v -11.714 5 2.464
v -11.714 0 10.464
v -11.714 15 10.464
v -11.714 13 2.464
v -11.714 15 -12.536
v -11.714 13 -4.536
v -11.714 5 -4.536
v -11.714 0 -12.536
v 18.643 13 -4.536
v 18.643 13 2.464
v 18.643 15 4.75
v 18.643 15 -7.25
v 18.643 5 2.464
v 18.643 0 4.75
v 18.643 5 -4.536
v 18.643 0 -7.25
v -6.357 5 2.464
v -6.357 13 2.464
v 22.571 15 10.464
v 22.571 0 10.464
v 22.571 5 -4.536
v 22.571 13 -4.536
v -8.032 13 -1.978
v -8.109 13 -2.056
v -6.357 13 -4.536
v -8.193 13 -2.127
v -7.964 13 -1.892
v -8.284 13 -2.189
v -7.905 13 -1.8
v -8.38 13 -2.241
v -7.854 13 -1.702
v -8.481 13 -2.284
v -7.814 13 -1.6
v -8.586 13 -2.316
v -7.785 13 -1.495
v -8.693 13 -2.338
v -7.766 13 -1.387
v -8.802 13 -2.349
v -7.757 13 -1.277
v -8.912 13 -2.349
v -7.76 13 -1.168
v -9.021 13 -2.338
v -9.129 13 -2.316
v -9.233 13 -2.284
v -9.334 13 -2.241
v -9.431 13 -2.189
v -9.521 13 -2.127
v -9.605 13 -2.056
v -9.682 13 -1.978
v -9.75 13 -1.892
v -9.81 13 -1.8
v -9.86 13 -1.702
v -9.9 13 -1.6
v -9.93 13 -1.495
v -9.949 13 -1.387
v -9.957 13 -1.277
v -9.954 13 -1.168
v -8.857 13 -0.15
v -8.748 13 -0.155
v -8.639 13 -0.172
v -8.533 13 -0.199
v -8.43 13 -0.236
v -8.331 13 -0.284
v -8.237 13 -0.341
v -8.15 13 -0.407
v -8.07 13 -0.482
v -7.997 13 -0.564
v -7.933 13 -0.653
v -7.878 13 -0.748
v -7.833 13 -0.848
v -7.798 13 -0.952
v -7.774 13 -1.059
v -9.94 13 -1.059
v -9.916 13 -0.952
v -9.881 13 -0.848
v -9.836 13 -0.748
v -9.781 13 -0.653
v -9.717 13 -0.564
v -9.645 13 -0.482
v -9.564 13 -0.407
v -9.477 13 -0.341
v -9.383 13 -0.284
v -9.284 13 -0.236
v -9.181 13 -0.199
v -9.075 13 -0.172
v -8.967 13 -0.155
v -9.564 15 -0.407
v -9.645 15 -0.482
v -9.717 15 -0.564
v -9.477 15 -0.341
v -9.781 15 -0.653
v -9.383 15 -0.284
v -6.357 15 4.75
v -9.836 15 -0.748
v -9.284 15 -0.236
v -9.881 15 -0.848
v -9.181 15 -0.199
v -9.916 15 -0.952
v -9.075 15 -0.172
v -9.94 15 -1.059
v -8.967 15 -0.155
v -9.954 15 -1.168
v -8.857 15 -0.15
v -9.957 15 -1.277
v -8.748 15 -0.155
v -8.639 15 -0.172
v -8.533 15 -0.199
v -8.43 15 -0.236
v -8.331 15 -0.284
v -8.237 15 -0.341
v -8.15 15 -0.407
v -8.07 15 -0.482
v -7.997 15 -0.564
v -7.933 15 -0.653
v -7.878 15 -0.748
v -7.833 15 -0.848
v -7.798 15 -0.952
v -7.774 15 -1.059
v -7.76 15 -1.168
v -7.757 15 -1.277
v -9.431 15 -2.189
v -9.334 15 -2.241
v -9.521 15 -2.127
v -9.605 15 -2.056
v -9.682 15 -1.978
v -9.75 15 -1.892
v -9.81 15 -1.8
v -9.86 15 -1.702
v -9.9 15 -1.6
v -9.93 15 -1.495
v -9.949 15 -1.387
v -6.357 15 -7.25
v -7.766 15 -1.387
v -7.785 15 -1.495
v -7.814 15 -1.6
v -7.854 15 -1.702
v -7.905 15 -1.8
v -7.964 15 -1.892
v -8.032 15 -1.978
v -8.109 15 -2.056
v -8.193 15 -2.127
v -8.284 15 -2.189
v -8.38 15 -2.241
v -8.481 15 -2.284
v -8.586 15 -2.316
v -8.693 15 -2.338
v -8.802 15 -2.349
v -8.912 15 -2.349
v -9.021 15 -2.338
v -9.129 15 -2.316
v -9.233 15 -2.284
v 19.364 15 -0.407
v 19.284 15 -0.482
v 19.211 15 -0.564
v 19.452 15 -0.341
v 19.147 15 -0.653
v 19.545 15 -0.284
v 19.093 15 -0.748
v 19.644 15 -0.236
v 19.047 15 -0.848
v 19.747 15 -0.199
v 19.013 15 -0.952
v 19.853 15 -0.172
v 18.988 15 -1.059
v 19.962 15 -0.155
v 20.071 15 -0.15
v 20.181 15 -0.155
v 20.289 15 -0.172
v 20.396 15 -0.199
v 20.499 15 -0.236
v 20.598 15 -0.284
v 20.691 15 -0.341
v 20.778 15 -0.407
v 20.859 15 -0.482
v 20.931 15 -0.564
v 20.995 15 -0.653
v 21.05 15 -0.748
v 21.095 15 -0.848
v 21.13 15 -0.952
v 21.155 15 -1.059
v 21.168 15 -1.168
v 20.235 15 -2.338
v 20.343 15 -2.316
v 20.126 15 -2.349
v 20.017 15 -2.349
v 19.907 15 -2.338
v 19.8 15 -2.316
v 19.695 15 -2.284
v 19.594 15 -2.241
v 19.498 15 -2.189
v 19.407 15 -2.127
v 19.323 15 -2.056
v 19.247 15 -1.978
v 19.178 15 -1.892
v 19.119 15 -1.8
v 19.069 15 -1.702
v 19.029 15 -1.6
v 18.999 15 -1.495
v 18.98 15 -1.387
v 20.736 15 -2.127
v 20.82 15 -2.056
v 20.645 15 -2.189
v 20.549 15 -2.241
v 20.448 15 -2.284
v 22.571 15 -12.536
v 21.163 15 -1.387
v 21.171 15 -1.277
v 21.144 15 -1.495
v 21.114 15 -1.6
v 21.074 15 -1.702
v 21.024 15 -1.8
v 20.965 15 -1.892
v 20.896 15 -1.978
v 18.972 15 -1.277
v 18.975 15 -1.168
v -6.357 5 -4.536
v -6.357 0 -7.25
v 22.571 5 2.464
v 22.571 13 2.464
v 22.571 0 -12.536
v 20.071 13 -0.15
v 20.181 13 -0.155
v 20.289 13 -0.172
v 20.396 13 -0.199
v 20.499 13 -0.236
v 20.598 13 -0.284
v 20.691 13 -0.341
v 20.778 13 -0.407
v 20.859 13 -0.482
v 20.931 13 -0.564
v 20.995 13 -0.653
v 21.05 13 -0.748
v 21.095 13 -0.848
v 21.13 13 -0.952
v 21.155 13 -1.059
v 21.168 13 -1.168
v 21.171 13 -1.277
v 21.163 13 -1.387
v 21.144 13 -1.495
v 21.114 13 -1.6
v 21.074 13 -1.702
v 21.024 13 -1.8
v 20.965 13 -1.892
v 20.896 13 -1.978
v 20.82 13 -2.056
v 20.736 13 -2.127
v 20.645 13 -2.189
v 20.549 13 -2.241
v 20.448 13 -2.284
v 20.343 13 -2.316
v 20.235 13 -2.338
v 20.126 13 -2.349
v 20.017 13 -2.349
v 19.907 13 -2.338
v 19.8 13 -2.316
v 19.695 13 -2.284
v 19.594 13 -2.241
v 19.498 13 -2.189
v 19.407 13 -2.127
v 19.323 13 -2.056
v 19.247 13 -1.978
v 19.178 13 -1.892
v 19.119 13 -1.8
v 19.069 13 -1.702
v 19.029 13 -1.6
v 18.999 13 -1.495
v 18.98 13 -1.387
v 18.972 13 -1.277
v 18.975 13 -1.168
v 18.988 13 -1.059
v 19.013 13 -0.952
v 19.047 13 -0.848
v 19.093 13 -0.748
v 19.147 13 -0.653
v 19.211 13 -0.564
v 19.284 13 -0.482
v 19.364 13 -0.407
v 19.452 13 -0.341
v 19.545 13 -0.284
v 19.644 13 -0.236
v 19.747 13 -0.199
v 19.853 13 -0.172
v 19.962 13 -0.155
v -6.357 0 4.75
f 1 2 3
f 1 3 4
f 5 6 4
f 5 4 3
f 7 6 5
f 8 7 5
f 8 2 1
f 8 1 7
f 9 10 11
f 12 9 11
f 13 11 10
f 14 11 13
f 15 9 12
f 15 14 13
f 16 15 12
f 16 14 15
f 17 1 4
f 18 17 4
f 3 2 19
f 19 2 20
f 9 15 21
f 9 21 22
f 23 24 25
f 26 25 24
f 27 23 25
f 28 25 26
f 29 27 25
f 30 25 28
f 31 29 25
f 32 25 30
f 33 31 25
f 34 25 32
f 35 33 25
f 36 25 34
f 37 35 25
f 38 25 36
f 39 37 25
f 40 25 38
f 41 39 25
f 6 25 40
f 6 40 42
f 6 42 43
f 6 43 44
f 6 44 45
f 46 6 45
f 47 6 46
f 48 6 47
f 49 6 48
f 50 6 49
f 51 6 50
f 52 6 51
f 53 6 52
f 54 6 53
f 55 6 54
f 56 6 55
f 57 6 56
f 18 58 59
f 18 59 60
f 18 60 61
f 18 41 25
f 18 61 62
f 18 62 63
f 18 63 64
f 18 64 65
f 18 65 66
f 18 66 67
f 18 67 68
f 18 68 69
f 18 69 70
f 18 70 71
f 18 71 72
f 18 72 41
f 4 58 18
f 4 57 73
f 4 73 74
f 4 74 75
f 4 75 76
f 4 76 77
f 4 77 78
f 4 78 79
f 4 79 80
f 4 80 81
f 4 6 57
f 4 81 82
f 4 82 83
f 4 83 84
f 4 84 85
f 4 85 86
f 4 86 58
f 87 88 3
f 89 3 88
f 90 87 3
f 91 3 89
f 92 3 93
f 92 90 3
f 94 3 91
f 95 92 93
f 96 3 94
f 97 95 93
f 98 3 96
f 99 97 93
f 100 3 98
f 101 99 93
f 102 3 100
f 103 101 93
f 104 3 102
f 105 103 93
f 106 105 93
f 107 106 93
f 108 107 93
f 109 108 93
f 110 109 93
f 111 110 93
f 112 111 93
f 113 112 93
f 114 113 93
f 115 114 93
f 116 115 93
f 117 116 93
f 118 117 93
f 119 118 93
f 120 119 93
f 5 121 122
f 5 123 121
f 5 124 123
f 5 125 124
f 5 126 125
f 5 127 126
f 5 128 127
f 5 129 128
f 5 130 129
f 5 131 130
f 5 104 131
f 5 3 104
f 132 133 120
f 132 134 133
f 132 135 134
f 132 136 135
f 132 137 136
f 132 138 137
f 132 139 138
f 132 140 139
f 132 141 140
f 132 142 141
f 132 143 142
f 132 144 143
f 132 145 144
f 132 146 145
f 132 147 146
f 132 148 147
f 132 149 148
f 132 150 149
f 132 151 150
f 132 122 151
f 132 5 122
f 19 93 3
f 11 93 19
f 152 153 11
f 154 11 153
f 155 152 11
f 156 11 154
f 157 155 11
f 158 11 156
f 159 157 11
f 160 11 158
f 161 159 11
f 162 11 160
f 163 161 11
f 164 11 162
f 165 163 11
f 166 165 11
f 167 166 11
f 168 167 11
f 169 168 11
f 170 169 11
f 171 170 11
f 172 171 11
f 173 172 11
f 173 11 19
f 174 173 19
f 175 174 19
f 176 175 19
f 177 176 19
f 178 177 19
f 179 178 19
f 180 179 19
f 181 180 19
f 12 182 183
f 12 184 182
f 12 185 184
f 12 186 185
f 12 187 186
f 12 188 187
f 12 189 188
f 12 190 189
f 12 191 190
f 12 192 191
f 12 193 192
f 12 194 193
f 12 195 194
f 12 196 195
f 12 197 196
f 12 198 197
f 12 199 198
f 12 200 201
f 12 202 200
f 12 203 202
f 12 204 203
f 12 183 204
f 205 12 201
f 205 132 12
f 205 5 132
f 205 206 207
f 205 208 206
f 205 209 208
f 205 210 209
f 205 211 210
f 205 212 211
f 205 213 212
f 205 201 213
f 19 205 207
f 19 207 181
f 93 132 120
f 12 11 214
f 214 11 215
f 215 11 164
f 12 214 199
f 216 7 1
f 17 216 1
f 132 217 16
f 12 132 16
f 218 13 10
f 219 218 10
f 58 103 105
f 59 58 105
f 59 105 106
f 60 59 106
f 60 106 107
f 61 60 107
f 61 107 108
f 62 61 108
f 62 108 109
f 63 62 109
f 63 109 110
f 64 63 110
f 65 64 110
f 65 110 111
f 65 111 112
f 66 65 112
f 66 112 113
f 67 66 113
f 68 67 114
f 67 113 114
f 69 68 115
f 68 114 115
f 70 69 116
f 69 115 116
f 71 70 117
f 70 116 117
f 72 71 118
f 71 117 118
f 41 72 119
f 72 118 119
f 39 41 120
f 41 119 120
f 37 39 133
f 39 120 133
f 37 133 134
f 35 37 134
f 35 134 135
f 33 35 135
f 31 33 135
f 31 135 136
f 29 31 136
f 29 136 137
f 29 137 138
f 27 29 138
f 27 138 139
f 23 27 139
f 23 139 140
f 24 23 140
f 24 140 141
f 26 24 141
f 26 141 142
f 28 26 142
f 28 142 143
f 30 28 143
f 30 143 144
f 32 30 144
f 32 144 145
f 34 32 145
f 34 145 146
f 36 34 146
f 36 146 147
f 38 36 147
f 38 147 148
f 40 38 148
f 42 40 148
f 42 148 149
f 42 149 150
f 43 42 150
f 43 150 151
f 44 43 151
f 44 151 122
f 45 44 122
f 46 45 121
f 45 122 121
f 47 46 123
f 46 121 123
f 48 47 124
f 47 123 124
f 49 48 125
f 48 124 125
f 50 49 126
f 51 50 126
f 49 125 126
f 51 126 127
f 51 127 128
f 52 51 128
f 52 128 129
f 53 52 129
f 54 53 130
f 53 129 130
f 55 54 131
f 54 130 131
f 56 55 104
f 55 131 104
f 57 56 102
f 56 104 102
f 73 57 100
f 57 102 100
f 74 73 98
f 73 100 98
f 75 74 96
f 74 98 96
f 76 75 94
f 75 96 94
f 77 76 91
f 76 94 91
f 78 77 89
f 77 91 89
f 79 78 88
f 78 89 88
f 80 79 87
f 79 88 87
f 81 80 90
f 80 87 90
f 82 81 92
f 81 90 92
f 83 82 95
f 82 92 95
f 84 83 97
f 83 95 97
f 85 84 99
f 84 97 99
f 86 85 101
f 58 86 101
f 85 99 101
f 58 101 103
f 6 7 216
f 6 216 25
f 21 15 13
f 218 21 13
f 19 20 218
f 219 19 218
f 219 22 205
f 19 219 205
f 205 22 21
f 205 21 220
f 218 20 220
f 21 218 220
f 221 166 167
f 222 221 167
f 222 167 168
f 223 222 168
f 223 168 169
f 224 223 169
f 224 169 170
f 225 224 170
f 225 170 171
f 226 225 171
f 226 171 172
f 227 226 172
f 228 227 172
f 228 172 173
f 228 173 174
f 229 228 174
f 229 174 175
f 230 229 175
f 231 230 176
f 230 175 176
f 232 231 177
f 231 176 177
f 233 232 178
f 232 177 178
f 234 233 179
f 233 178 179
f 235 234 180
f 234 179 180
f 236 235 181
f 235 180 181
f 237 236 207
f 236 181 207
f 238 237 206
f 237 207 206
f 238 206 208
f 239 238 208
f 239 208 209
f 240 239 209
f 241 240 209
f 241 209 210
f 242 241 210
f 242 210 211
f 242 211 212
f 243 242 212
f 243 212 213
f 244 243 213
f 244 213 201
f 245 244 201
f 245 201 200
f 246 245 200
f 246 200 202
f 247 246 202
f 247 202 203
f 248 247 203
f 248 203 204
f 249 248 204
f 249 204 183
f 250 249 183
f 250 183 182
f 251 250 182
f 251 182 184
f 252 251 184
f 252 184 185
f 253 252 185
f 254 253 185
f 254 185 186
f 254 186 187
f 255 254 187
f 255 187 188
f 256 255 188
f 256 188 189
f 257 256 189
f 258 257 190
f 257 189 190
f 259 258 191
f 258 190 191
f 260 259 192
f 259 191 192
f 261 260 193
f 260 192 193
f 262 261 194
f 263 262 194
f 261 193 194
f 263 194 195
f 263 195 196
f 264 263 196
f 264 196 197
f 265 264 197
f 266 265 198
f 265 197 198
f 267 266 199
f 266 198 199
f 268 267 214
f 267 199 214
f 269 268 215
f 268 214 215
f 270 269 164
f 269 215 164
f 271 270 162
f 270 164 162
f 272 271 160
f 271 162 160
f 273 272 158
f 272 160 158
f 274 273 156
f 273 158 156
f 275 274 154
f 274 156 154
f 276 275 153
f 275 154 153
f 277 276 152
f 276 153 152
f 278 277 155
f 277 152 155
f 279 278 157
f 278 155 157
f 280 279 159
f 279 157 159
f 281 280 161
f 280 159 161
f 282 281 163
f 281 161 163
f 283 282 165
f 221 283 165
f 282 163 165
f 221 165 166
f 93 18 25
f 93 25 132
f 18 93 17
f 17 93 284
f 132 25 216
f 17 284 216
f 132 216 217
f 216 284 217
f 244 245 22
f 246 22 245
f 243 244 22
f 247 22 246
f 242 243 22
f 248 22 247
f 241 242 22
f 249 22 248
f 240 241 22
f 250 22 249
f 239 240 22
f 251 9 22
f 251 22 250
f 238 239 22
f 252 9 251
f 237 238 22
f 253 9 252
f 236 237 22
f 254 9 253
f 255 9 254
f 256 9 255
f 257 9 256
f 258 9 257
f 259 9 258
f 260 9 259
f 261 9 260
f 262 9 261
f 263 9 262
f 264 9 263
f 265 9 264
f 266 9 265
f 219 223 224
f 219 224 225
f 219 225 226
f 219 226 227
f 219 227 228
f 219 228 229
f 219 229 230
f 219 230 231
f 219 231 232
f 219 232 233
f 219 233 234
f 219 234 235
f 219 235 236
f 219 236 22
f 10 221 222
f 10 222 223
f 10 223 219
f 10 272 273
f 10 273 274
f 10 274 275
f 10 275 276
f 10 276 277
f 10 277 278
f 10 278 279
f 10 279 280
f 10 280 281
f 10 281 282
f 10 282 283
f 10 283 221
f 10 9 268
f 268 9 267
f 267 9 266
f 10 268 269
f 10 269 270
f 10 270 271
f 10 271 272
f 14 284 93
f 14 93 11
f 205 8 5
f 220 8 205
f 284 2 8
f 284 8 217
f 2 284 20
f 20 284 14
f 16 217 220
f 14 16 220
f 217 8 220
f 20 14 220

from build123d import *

# Parameters (mm, degrees)
ESQUISSE1_W             = 34.285714285
ESQUISSE1_H             = 23
ESQUISSE1_W_2           = 25
ESQUISSE1_H_2           = 12
BOSS_EXTRU_1_DEPTH      = 15
ESQUISSE2_W             = 7
ESQUISSE2_H             = 8
ENL_V_MAT_EXTRU_1_DEPTH = 60
ESQUISSE3_R             = 1.1
ENL_V_MAT_EXTRU_2_DEPTH = 10


with BuildPart() as part:
    # Esquisse1 → Boss.-Extru.1 (new body)
    with BuildSketch(Plane(origin=(0, 0, 0), x_dir=(1, 0, 0), z_dir=(0, 1, 0))):
        with Locations((5.428571429, 1.035714286)):
            Rectangle(ESQUISSE1_W, ESQUISSE1_H)
        with Locations((6.142857143, 1.25)):
            Rectangle(ESQUISSE1_W_2, ESQUISSE1_H_2, mode=Mode.SUBTRACT)
    extrude(amount=BOSS_EXTRU_1_DEPTH)

    # Esquisse2 → Enlèv. mat.-Extru.1 (cut)
    with BuildSketch(Plane.ZY.offset(11.714285714)):
        with Locations((-1.035714286, 9)):
            Rectangle(ESQUISSE2_W, ESQUISSE2_H)
    extrude(amount=-ENL_V_MAT_EXTRU_1_DEPTH, mode=Mode.SUBTRACT)

    # Esquisse3 → Enlèv. mat.-Extru.2 (cut)
    with BuildSketch(Plane(origin=(0, 15, 0), x_dir=(1, 0, 0), z_dir=(0, 1, 0))):
        with Locations(Location((-8.857142857, 1.25, 0), (0, 0, 270))):
            Circle(ESQUISSE3_R)
        with Locations(Location((20.071428571, 1.25, 0), (0, 0, 270))):
            Circle(ESQUISSE3_R)
    extrude(amount=-ENL_V_MAT_EXTRU_2_DEPTH, mode=Mode.SUBTRACT)


solid = part.part
